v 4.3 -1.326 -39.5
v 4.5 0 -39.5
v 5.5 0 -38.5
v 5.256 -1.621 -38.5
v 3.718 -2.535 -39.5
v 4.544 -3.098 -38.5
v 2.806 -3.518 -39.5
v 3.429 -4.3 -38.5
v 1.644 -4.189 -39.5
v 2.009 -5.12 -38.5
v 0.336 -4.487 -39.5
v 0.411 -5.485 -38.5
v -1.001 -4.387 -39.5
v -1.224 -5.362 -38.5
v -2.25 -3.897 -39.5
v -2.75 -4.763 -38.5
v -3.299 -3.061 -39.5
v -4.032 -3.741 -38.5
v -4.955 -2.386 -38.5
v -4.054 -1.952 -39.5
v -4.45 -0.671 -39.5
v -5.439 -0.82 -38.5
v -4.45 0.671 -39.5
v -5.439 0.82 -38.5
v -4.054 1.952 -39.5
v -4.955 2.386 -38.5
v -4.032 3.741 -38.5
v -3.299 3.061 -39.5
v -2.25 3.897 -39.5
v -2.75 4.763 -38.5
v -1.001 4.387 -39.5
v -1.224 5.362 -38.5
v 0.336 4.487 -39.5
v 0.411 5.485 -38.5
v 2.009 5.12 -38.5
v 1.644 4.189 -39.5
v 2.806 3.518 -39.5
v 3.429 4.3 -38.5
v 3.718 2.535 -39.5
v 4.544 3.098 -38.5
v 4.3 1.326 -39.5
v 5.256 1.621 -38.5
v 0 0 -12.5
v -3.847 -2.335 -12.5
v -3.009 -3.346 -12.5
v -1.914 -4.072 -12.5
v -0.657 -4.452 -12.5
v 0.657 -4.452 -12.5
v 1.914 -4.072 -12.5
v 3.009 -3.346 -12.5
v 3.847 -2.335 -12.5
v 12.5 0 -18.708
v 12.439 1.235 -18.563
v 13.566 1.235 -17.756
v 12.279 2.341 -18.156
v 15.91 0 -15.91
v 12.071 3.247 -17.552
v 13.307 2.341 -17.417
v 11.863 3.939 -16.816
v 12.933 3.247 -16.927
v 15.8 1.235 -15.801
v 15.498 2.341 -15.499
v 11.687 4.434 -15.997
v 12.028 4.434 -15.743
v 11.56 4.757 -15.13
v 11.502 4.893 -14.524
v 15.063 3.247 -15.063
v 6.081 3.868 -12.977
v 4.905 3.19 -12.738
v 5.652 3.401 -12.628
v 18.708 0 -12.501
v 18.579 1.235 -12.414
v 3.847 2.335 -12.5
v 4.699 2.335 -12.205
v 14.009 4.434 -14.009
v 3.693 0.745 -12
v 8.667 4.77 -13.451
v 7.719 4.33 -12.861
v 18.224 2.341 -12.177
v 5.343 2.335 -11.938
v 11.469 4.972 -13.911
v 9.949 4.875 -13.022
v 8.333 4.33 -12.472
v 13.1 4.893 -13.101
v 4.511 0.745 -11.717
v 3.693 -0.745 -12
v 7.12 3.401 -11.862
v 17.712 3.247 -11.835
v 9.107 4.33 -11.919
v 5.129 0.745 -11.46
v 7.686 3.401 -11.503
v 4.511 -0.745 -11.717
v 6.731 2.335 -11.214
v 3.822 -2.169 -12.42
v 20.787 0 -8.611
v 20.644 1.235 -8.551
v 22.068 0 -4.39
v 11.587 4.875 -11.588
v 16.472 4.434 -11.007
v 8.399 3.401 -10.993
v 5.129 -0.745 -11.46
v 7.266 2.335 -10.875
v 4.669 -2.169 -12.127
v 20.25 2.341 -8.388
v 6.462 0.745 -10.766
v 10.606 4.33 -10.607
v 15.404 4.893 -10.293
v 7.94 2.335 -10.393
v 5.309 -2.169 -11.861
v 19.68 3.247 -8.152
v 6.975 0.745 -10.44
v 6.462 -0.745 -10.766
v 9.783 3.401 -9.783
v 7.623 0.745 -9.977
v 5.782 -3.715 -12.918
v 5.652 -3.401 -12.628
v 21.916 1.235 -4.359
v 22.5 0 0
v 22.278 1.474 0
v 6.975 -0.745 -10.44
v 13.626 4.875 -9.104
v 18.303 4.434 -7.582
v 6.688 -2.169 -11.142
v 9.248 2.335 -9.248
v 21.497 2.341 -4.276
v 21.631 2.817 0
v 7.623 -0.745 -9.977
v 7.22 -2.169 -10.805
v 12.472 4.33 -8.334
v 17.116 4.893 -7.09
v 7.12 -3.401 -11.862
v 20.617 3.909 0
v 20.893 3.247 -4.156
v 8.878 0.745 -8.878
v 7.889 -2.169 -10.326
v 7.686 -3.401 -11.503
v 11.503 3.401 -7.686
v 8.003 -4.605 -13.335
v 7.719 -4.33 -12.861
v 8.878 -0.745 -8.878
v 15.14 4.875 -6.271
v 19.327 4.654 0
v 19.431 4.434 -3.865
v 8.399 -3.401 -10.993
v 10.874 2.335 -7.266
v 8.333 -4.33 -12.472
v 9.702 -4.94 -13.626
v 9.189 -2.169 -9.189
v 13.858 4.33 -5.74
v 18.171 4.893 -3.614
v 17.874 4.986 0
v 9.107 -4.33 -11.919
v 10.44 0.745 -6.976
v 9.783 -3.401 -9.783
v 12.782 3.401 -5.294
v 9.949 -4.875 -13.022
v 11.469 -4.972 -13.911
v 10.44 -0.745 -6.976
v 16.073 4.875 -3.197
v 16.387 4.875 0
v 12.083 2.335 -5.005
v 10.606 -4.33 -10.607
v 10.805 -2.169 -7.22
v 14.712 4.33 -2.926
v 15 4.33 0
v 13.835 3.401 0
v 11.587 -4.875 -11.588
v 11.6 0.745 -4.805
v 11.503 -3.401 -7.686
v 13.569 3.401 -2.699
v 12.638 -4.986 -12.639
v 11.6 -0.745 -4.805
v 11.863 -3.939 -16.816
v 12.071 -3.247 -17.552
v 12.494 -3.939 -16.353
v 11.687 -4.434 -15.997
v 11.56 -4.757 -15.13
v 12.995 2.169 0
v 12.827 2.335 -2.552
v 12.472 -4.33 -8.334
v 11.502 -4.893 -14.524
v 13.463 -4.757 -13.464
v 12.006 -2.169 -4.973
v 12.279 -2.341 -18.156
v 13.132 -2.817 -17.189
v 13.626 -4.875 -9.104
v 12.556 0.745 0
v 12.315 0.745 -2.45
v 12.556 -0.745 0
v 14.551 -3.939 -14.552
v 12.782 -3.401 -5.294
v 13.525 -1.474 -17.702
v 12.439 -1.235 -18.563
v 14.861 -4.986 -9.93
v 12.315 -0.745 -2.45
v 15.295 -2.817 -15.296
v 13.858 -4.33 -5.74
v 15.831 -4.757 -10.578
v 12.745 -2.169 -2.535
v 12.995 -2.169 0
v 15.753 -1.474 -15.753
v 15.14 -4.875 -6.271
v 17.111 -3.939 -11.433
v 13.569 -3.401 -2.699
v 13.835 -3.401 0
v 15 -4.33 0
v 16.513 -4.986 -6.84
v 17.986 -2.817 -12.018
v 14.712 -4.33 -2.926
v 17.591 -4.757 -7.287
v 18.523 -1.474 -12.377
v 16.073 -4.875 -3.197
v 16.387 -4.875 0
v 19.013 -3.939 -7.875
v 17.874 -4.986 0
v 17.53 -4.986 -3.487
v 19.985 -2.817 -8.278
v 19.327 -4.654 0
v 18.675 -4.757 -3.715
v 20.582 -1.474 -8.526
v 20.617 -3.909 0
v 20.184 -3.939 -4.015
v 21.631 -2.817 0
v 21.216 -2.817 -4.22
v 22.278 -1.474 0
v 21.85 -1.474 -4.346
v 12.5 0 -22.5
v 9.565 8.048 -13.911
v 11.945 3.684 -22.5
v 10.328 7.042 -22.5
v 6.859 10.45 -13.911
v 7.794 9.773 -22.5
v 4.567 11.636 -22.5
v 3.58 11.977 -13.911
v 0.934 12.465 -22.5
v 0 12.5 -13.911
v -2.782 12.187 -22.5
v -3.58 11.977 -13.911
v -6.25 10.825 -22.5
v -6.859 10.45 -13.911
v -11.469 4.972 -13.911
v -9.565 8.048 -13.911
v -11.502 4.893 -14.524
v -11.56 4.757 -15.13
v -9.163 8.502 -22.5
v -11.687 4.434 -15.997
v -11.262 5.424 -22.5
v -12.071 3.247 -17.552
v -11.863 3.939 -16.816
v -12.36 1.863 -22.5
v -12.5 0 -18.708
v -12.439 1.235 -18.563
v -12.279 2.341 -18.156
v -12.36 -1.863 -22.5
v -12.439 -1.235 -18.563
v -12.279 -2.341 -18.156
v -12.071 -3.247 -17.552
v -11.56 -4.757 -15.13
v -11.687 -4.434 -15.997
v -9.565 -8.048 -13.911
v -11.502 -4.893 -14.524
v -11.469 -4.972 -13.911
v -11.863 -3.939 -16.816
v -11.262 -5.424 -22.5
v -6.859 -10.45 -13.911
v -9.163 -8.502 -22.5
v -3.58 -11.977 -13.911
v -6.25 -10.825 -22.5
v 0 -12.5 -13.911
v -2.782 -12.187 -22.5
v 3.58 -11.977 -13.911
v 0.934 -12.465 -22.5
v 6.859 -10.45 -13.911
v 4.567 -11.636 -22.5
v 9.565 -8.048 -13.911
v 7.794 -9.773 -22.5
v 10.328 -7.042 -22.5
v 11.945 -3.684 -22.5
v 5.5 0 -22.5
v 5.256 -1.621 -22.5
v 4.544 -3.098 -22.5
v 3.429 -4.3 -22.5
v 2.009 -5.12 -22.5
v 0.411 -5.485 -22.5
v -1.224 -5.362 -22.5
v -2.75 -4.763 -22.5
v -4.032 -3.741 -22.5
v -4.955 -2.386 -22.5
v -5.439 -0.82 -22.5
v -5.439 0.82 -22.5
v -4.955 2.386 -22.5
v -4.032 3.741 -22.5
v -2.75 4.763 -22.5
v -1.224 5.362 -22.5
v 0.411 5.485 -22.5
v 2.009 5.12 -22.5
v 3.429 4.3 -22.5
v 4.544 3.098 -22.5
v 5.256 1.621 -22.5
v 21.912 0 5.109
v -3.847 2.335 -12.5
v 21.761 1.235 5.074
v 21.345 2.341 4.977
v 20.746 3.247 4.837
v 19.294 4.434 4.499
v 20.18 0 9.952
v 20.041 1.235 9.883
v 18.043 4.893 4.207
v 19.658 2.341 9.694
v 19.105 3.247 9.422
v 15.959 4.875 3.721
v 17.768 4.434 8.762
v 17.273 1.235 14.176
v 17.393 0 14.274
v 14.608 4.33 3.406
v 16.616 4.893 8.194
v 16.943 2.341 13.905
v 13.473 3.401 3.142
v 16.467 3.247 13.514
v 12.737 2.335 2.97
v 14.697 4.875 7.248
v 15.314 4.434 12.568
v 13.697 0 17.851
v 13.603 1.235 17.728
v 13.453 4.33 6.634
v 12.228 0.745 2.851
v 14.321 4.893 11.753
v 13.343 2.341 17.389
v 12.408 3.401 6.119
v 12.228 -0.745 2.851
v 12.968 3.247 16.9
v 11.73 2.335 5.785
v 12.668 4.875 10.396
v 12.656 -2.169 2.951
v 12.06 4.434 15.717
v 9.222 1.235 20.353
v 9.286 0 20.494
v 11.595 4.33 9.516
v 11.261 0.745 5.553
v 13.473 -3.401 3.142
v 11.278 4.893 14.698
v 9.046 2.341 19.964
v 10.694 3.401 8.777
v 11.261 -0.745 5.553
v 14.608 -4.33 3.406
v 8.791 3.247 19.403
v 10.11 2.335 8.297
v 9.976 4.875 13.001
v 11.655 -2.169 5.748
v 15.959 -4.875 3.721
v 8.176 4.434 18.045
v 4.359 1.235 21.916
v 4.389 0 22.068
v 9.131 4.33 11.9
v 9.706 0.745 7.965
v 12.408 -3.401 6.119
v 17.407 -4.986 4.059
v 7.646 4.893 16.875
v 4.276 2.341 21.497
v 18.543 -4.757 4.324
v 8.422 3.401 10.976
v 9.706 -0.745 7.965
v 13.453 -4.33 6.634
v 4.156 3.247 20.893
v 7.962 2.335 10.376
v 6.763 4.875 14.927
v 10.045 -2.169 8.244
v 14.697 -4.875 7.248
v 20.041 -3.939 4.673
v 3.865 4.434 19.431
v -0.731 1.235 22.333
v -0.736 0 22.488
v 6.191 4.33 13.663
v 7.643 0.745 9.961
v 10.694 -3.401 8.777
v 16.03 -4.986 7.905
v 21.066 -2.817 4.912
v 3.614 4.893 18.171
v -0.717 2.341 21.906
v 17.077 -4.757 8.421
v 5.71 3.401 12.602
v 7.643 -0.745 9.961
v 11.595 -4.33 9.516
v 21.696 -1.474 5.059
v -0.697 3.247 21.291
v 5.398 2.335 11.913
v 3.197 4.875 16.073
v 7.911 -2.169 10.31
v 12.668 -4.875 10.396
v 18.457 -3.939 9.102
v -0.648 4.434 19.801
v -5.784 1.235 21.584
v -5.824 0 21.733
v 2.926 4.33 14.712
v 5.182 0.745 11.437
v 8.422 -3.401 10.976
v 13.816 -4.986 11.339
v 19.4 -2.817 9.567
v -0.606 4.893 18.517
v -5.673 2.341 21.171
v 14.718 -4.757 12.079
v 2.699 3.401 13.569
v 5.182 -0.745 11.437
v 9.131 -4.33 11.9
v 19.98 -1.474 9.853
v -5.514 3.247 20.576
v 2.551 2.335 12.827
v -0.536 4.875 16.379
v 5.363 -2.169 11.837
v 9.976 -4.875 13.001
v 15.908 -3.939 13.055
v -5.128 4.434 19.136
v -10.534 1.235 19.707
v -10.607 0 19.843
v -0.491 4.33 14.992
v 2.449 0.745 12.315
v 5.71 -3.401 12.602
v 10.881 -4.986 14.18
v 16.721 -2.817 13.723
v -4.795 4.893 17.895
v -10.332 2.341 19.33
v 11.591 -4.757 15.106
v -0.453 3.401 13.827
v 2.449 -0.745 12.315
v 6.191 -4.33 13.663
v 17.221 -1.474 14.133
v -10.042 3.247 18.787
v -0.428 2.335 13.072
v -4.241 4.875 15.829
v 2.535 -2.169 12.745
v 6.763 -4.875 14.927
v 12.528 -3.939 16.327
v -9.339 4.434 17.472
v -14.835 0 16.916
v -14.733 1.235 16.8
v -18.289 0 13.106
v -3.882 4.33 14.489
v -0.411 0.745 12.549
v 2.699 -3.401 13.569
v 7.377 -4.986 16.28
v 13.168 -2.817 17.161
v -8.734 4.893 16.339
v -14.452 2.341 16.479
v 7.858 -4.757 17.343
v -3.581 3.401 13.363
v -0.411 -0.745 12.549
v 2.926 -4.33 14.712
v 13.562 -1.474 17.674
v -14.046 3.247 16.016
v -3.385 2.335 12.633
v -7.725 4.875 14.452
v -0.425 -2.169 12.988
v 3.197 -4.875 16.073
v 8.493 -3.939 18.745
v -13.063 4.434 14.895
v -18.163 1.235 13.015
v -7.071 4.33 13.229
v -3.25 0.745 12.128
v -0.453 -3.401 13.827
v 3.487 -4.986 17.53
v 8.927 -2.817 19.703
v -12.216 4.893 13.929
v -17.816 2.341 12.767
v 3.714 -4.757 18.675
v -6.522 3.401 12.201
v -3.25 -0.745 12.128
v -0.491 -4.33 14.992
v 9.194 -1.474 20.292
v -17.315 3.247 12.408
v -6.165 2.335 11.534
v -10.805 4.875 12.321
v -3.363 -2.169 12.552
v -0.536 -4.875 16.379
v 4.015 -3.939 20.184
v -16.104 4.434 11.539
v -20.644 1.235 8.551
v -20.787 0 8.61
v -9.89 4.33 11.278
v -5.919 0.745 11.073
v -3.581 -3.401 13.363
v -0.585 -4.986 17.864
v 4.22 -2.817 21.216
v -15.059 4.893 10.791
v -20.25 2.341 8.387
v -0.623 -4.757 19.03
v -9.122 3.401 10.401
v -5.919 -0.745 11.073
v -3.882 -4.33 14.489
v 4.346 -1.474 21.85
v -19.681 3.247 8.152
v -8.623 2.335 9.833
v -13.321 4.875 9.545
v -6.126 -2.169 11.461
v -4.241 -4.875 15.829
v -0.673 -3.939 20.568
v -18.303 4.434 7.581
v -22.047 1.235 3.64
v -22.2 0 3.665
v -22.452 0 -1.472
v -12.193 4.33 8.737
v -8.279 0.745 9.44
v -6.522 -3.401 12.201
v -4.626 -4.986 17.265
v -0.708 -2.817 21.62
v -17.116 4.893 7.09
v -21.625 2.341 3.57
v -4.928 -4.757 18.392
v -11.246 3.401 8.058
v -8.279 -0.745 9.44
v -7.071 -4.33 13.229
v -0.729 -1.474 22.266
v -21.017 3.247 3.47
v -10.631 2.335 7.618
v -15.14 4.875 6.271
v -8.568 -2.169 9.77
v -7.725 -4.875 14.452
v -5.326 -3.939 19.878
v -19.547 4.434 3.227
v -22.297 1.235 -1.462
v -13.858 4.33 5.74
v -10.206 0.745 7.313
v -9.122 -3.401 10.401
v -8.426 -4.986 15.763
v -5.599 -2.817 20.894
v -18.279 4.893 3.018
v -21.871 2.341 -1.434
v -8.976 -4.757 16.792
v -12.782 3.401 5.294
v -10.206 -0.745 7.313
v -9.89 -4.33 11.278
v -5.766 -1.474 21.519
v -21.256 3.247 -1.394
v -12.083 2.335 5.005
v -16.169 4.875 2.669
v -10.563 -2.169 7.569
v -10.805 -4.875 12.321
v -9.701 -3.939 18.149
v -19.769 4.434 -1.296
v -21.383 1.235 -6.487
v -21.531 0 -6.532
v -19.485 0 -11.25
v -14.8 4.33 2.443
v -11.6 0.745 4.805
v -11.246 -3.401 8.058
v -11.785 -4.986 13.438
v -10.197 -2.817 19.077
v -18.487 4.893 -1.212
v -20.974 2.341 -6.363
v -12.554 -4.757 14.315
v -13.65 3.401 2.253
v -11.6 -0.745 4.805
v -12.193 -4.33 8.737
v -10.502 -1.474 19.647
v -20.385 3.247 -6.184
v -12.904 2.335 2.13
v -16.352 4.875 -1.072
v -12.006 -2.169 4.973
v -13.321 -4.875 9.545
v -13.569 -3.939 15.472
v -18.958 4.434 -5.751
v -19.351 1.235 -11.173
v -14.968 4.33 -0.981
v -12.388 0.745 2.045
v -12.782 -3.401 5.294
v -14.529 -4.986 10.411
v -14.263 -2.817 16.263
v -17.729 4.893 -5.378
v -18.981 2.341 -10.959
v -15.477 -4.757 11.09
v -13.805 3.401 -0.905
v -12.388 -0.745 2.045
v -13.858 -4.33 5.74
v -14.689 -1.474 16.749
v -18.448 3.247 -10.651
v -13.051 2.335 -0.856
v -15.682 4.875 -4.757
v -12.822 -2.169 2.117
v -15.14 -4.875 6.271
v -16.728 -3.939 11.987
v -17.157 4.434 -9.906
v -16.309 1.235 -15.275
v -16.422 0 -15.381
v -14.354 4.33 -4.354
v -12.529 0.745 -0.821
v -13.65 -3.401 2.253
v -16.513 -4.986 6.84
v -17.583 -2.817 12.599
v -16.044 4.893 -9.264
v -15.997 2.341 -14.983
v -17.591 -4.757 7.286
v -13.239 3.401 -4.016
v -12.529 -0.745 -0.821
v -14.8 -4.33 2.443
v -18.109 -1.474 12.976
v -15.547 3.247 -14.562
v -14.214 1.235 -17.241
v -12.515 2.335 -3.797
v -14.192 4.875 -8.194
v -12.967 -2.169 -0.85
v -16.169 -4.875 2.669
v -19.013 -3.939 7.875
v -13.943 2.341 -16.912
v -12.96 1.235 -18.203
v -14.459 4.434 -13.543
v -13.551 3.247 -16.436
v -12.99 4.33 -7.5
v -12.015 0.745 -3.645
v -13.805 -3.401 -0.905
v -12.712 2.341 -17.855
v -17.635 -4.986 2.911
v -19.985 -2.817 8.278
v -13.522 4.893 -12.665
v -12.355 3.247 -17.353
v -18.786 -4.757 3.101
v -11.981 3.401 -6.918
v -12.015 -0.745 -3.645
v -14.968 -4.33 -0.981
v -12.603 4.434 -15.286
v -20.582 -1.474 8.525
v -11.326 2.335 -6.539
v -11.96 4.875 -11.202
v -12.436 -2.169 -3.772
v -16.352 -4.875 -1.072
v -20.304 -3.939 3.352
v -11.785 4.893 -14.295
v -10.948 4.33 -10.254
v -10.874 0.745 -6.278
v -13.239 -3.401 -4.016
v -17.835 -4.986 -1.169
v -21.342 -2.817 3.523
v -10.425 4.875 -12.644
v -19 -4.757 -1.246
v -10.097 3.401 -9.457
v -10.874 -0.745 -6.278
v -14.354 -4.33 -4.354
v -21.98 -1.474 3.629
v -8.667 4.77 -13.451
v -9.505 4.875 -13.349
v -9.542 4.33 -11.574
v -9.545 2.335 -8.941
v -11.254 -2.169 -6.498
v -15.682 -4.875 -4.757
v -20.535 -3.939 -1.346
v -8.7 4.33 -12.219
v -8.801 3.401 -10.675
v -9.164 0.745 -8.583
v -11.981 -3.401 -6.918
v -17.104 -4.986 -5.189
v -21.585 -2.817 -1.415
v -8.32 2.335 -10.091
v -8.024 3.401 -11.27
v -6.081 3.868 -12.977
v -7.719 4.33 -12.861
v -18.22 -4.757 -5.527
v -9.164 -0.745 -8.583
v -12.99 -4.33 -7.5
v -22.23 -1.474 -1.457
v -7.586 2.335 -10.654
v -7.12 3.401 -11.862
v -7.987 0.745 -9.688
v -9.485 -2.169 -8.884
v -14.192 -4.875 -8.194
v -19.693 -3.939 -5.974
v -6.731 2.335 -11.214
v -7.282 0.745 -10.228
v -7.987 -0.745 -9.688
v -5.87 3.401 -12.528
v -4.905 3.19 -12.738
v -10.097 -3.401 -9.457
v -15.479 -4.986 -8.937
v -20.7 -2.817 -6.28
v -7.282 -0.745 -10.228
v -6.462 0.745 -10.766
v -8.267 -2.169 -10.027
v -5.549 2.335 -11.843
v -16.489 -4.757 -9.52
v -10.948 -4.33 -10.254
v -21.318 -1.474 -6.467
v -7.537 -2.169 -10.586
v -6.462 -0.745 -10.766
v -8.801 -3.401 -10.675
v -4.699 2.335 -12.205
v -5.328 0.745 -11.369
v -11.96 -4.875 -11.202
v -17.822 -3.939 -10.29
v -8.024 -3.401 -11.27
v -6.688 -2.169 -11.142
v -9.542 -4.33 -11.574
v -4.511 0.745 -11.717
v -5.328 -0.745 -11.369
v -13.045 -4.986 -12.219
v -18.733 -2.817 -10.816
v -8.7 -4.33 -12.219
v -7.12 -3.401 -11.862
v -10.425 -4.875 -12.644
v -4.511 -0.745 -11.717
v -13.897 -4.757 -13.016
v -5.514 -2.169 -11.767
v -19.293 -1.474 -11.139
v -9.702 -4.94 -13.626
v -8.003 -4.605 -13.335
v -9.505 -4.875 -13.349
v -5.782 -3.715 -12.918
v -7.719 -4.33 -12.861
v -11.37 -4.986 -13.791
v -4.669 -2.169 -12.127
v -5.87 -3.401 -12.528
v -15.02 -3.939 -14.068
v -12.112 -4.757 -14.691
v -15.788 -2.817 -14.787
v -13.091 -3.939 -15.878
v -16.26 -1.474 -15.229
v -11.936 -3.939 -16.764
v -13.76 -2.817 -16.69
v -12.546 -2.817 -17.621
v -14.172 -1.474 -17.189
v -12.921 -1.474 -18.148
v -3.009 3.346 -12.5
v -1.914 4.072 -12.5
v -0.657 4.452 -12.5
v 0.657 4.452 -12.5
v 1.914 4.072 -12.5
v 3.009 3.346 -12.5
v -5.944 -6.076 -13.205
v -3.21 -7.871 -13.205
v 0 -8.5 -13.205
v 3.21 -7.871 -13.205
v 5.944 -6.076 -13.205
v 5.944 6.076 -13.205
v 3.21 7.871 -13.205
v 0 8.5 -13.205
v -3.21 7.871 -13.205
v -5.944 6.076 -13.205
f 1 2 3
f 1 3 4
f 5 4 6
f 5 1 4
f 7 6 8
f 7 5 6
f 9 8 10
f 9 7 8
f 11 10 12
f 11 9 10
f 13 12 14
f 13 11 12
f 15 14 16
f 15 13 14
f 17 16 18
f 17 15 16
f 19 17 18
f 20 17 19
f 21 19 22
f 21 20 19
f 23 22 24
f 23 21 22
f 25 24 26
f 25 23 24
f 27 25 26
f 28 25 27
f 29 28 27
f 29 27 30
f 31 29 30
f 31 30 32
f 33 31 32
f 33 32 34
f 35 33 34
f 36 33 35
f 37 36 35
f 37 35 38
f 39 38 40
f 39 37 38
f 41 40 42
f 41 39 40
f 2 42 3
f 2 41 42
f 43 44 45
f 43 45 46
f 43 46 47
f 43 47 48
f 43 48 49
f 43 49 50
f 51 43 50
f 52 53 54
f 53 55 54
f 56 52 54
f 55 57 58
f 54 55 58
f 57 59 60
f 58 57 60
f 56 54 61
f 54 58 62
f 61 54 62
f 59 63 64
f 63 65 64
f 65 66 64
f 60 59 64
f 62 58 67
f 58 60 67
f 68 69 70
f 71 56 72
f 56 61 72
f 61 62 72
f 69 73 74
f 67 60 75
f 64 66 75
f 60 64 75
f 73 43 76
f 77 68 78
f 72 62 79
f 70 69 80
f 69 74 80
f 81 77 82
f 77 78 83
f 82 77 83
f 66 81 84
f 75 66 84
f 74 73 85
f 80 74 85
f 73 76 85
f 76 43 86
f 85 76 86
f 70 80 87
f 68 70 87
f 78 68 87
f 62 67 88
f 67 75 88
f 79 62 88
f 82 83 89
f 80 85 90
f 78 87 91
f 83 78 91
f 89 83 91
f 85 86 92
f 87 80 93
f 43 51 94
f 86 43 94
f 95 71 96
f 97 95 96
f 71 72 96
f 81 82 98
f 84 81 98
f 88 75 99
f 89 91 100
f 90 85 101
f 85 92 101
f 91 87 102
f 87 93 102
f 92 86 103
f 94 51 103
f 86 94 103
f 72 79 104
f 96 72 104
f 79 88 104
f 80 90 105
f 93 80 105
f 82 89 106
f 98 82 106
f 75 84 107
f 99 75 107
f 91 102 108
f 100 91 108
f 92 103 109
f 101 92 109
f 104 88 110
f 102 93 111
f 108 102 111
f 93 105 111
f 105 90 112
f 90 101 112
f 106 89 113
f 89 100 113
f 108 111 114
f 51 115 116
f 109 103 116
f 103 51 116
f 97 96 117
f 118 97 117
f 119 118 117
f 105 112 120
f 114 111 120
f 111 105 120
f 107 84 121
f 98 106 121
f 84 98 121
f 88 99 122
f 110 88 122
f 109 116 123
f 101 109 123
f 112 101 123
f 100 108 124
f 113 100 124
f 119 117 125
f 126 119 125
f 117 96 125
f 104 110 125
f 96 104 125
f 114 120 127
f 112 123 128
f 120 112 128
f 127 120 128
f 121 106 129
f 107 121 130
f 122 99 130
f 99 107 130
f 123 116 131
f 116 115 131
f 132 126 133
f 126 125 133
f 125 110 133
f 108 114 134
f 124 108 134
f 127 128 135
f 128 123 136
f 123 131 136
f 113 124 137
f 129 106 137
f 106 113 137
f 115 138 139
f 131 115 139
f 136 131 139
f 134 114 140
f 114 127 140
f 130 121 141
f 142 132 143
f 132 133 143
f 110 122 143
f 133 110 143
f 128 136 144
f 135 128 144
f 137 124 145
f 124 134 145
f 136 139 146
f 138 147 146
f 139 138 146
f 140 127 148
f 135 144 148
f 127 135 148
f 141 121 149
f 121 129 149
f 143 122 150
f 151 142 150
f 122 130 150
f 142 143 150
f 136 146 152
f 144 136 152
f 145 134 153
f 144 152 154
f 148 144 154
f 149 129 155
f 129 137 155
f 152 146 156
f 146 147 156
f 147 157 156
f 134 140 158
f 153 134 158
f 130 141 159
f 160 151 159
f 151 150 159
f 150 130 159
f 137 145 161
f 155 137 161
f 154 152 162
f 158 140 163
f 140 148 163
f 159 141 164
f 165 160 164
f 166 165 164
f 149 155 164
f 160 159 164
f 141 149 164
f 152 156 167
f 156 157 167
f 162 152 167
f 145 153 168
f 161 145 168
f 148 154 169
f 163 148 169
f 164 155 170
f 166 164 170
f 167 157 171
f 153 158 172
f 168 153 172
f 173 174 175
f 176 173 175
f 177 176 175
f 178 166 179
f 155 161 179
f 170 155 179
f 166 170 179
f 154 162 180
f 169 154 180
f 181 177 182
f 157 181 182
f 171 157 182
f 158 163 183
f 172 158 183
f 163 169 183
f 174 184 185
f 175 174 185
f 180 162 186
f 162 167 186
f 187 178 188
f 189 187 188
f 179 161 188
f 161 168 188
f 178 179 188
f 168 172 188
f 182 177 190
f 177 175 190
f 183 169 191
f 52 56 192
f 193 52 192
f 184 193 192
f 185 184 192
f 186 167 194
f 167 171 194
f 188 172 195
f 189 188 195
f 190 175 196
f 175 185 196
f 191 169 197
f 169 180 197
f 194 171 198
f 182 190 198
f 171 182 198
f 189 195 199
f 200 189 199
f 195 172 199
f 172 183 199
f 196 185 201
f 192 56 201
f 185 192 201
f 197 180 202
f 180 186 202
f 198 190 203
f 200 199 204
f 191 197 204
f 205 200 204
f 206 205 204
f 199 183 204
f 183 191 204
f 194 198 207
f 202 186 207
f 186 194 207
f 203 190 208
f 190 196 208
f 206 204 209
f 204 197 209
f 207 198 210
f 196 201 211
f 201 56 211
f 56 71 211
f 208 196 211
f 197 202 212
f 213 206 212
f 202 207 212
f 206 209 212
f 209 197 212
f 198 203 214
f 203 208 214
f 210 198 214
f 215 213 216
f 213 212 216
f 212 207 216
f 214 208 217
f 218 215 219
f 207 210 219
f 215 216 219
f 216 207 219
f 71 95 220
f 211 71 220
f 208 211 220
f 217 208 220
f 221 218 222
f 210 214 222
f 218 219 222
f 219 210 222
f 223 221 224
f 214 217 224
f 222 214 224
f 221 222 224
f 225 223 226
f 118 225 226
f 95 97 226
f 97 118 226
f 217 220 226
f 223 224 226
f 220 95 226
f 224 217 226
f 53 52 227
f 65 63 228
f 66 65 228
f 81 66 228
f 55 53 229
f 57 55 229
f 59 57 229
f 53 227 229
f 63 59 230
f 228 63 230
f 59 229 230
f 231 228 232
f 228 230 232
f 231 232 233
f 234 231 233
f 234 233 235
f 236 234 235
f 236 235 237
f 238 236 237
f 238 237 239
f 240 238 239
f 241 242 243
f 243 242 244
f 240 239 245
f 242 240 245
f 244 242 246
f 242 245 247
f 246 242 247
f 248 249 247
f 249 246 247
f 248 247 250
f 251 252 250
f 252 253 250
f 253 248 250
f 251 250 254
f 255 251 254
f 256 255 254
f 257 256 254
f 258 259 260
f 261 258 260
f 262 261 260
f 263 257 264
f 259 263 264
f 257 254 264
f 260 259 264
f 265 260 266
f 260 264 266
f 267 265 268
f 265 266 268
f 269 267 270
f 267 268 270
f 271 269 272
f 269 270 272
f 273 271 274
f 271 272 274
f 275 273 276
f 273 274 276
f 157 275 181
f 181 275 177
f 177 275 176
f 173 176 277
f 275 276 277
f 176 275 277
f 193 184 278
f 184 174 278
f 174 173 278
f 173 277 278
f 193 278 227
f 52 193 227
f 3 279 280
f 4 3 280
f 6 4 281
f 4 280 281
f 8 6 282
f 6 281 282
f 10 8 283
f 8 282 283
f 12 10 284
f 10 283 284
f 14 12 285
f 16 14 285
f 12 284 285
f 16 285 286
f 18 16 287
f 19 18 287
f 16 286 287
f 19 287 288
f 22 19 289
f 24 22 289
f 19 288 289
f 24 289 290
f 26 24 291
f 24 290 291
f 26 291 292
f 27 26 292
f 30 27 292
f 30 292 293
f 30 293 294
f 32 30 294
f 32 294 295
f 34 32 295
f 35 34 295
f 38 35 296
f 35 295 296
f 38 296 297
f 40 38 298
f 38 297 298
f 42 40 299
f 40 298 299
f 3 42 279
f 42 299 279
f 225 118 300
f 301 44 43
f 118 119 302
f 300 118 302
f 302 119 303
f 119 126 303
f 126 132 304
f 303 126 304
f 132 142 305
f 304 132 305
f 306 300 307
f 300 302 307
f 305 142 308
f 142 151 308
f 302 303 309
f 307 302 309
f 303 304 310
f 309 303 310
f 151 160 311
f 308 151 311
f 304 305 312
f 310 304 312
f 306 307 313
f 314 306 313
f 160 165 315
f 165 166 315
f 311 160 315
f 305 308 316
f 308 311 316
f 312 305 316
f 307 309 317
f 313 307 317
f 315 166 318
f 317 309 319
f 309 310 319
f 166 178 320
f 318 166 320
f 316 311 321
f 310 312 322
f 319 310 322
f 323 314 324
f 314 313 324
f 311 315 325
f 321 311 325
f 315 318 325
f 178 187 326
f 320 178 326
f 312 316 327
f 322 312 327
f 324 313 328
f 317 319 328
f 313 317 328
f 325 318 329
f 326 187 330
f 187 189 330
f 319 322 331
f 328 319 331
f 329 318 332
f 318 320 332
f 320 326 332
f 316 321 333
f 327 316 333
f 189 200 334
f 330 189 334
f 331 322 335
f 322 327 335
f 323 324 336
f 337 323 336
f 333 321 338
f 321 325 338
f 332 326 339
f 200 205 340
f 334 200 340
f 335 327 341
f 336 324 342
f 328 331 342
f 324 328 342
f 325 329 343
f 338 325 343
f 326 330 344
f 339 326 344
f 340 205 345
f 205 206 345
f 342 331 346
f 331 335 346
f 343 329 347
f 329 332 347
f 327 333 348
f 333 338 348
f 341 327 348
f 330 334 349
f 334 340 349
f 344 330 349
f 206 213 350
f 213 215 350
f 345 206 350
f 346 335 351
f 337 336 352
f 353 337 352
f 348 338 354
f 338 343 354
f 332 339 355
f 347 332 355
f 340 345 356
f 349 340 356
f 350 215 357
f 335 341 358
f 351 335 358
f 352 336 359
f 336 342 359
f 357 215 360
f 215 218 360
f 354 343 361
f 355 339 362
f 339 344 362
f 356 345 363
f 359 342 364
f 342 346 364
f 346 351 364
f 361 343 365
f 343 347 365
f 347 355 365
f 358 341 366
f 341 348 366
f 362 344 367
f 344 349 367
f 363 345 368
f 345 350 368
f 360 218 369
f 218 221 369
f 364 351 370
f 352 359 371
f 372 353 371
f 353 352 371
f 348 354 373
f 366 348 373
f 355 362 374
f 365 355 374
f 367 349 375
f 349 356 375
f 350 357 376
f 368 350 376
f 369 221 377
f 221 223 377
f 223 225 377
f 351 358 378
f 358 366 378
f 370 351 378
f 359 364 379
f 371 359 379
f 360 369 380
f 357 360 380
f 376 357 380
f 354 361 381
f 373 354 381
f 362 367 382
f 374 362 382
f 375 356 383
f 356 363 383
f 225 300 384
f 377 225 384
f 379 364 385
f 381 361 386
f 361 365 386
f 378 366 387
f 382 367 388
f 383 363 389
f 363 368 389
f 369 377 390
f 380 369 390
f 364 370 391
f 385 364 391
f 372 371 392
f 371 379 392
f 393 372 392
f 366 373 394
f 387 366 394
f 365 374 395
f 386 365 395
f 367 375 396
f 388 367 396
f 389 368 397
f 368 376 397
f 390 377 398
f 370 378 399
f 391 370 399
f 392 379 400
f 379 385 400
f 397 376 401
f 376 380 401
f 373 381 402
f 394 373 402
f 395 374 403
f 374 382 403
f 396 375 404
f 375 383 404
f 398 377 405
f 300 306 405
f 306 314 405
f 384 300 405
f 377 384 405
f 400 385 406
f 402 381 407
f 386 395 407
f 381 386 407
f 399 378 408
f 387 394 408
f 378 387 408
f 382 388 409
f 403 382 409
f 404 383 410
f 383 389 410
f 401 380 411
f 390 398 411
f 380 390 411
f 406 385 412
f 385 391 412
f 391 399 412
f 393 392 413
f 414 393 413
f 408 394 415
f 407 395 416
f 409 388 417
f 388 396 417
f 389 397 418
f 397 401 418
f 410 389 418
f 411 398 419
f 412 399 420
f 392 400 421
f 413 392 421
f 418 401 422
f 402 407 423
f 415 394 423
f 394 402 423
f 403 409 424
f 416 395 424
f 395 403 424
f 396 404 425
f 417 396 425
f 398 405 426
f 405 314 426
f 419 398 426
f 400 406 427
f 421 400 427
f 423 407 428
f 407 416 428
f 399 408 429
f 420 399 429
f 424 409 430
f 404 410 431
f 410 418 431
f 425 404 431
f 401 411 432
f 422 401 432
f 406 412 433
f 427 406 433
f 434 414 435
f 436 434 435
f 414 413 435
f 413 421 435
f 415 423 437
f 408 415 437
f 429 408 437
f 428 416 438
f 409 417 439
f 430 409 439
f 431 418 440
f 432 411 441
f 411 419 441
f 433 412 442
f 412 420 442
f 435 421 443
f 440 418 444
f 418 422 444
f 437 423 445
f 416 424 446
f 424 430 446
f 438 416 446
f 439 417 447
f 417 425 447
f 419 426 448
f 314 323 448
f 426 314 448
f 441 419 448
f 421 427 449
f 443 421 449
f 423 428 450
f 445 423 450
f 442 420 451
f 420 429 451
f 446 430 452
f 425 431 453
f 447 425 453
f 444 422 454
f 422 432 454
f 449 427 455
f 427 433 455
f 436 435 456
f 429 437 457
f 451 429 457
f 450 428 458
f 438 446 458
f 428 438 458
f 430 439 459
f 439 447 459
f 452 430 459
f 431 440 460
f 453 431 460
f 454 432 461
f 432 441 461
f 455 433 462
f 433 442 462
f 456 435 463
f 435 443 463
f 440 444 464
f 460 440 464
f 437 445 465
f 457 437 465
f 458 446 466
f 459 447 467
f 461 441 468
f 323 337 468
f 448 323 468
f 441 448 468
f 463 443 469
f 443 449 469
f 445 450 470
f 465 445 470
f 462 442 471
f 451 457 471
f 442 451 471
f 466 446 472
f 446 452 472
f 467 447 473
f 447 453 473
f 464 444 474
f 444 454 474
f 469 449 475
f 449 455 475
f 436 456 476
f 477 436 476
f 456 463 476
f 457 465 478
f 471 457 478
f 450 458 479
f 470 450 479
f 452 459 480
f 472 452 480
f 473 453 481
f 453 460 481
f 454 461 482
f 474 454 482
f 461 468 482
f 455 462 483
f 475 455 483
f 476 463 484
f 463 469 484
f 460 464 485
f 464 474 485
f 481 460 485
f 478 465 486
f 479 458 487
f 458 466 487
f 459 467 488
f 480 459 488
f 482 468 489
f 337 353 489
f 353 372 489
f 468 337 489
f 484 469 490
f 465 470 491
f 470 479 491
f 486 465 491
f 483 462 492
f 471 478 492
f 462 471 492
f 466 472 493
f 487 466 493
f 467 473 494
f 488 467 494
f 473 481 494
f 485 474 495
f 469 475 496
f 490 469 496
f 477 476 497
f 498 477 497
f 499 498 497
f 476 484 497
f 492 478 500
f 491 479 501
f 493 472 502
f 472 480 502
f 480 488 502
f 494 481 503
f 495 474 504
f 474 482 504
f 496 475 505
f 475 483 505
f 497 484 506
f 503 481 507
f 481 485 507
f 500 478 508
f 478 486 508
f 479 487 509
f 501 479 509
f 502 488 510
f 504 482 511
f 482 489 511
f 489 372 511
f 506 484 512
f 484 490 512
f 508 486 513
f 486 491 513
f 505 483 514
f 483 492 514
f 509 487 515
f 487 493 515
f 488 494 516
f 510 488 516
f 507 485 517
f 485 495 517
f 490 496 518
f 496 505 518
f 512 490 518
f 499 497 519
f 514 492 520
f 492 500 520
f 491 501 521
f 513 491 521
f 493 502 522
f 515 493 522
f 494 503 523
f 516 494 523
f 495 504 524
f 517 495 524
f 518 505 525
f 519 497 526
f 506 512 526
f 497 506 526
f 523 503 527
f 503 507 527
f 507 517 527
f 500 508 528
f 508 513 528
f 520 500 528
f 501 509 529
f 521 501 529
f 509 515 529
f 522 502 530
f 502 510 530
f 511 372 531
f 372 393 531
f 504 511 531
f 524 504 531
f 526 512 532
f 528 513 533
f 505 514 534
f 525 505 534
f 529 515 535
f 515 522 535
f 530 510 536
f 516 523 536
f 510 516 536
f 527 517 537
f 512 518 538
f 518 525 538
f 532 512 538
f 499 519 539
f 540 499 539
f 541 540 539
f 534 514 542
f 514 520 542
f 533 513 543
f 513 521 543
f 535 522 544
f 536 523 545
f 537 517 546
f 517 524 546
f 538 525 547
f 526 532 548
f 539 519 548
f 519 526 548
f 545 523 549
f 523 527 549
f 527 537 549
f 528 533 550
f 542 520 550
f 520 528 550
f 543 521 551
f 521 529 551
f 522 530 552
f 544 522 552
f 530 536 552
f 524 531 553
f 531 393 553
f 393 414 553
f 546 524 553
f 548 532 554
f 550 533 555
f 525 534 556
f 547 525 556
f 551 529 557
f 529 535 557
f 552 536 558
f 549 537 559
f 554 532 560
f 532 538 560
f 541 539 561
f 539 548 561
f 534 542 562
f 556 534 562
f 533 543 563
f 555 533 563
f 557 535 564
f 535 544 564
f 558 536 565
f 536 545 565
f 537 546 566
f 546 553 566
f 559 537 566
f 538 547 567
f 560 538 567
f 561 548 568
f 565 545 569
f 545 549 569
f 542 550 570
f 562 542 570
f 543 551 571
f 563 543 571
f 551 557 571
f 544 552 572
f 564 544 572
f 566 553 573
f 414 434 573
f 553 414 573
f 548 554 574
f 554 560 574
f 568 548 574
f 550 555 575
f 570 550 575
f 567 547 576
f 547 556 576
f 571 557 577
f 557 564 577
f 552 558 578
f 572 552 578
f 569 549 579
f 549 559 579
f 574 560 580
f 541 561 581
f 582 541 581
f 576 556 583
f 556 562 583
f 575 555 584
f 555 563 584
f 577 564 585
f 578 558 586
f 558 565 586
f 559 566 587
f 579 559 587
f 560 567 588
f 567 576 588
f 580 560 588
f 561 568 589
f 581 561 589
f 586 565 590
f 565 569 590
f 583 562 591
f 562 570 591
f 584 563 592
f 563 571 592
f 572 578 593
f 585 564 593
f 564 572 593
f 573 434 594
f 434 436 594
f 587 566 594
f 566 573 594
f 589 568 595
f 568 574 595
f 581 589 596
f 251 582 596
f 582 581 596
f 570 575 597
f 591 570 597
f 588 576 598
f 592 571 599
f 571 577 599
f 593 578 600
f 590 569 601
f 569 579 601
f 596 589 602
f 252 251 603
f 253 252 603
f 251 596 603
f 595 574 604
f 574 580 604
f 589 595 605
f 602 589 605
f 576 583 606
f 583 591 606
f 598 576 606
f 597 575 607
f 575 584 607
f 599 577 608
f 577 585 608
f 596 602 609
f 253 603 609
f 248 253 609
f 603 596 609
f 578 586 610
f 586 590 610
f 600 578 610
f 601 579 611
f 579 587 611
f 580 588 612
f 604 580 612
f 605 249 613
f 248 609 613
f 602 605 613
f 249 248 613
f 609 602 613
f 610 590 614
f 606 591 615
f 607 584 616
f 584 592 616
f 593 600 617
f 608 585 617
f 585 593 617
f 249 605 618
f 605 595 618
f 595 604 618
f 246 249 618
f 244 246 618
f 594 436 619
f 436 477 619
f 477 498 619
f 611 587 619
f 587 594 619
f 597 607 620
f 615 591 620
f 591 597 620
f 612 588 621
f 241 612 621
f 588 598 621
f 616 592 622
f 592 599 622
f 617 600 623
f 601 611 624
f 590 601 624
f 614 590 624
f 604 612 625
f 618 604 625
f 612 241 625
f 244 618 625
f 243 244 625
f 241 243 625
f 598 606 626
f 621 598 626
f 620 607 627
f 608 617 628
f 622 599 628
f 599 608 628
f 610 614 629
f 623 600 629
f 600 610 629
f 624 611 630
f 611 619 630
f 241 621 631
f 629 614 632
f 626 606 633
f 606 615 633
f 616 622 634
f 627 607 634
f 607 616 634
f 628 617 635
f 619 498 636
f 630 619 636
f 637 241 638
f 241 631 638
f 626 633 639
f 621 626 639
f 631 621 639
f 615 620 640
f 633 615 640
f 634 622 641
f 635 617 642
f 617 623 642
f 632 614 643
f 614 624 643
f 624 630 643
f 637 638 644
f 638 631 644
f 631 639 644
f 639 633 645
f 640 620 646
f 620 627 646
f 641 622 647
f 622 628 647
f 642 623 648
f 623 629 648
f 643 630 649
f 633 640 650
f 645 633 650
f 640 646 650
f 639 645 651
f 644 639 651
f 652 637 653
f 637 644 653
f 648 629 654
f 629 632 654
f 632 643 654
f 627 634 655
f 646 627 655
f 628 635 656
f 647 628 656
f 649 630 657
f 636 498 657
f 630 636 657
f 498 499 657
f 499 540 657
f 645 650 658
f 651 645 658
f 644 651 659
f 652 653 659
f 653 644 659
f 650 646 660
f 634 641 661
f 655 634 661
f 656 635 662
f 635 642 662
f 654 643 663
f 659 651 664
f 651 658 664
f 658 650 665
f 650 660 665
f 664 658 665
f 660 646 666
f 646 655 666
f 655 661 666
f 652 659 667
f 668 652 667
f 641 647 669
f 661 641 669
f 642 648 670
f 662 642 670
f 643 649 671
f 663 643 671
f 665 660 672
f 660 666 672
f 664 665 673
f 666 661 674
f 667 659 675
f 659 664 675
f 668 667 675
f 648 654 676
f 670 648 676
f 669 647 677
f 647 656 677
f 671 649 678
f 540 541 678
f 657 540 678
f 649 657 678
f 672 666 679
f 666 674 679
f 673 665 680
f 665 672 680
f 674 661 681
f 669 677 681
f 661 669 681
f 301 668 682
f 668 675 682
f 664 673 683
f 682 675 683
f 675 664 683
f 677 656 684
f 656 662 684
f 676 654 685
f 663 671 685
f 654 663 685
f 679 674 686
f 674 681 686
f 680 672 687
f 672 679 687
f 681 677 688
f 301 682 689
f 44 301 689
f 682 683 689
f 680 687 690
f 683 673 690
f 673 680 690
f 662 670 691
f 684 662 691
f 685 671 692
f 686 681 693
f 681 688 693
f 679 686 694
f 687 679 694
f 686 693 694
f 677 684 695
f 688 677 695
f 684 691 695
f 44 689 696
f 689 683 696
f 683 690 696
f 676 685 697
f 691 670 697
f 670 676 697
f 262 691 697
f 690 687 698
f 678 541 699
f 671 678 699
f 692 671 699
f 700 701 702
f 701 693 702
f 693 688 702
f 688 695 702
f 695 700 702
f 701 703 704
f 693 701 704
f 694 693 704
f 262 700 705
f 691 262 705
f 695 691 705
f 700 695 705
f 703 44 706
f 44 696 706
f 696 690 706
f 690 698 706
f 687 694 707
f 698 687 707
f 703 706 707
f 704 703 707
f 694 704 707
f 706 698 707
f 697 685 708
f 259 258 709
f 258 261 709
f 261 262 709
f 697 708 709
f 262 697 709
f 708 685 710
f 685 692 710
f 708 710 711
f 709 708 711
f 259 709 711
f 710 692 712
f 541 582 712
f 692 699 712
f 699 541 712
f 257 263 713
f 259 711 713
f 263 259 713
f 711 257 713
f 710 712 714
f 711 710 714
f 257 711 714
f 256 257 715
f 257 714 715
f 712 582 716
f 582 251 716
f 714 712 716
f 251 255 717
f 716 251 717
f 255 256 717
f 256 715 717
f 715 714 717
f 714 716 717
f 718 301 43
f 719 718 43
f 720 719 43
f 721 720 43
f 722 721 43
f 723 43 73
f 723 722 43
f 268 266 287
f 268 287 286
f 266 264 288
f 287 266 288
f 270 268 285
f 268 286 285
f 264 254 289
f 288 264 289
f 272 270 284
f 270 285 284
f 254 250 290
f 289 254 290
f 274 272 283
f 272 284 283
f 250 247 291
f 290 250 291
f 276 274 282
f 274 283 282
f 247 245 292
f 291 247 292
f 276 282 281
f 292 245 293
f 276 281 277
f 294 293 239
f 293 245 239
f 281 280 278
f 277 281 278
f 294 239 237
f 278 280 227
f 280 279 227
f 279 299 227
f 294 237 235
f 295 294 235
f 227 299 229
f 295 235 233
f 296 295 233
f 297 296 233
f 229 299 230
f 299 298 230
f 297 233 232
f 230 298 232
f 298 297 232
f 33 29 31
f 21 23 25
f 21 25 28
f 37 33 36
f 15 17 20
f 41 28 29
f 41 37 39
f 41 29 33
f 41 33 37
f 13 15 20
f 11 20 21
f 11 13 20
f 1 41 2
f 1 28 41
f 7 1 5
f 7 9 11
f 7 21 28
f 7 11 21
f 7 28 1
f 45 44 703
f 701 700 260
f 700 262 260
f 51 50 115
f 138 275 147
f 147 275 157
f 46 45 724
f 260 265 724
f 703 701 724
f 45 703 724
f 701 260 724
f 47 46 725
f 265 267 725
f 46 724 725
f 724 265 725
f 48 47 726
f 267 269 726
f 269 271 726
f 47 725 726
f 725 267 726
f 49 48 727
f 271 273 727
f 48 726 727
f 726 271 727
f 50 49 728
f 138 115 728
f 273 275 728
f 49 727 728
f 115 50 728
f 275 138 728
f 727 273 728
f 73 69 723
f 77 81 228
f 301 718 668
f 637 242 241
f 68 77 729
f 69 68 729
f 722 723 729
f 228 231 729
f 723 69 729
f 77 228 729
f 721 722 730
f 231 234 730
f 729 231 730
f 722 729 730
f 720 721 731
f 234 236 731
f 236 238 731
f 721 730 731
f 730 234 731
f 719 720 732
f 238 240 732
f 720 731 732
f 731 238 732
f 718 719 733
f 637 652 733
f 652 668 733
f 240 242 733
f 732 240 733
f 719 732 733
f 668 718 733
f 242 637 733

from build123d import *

# Parameters (mm, degrees)
F1_R     = 12.5
F3_DEPTH = 10
F4_SIZE2 = 1.4106158457
F4_SIZE  = 8
F2_R     = 5
F6_R     = 5.5
F7_DEPTH = 17
F8_SIZE  = 1


with BuildPart() as f3:
    # F1 (on offset) → F3 (new body)
    with BuildSketch(Plane.XY.offset(-22.5)):
        Circle(F1_R)
    extrude(amount=F3_DEPTH)

    # F4
    f4_edges = [f3.edges().sort_by_distance(p)[0] for p in [
        (-12.5, 0, -12.5),
    ]]
    f4_side = f3.faces().sort_by_distance((0, 0, -12.5))[0]
    chamfer(f4_edges, length=F4_SIZE, length2=F4_SIZE2, reference=f4_side)

    # F2 (on Top) → F5 (revolve)
    with BuildSketch(Plane.XY):
        with Locations((17.5, 0)):
            Circle(F2_R)
    revolve(axis=Axis((0, 2.5942958891, 0), (0, -1, 0)))

    # F6 (on face) → F7 (join)
    with BuildSketch(Plane(origin=(0, 0, -22.5), x_dir=(1, 0, 0), z_dir=(0, 0, -1))):
        Circle(F6_R)
    extrude(amount=F7_DEPTH)

    # F8
    f8_edges = [f3.edges().sort_by_distance(p)[0] for p in [
        (-5.5, 0, -39.5),
    ]]
    chamfer(f8_edges, length=F8_SIZE)


solid = f3.part
